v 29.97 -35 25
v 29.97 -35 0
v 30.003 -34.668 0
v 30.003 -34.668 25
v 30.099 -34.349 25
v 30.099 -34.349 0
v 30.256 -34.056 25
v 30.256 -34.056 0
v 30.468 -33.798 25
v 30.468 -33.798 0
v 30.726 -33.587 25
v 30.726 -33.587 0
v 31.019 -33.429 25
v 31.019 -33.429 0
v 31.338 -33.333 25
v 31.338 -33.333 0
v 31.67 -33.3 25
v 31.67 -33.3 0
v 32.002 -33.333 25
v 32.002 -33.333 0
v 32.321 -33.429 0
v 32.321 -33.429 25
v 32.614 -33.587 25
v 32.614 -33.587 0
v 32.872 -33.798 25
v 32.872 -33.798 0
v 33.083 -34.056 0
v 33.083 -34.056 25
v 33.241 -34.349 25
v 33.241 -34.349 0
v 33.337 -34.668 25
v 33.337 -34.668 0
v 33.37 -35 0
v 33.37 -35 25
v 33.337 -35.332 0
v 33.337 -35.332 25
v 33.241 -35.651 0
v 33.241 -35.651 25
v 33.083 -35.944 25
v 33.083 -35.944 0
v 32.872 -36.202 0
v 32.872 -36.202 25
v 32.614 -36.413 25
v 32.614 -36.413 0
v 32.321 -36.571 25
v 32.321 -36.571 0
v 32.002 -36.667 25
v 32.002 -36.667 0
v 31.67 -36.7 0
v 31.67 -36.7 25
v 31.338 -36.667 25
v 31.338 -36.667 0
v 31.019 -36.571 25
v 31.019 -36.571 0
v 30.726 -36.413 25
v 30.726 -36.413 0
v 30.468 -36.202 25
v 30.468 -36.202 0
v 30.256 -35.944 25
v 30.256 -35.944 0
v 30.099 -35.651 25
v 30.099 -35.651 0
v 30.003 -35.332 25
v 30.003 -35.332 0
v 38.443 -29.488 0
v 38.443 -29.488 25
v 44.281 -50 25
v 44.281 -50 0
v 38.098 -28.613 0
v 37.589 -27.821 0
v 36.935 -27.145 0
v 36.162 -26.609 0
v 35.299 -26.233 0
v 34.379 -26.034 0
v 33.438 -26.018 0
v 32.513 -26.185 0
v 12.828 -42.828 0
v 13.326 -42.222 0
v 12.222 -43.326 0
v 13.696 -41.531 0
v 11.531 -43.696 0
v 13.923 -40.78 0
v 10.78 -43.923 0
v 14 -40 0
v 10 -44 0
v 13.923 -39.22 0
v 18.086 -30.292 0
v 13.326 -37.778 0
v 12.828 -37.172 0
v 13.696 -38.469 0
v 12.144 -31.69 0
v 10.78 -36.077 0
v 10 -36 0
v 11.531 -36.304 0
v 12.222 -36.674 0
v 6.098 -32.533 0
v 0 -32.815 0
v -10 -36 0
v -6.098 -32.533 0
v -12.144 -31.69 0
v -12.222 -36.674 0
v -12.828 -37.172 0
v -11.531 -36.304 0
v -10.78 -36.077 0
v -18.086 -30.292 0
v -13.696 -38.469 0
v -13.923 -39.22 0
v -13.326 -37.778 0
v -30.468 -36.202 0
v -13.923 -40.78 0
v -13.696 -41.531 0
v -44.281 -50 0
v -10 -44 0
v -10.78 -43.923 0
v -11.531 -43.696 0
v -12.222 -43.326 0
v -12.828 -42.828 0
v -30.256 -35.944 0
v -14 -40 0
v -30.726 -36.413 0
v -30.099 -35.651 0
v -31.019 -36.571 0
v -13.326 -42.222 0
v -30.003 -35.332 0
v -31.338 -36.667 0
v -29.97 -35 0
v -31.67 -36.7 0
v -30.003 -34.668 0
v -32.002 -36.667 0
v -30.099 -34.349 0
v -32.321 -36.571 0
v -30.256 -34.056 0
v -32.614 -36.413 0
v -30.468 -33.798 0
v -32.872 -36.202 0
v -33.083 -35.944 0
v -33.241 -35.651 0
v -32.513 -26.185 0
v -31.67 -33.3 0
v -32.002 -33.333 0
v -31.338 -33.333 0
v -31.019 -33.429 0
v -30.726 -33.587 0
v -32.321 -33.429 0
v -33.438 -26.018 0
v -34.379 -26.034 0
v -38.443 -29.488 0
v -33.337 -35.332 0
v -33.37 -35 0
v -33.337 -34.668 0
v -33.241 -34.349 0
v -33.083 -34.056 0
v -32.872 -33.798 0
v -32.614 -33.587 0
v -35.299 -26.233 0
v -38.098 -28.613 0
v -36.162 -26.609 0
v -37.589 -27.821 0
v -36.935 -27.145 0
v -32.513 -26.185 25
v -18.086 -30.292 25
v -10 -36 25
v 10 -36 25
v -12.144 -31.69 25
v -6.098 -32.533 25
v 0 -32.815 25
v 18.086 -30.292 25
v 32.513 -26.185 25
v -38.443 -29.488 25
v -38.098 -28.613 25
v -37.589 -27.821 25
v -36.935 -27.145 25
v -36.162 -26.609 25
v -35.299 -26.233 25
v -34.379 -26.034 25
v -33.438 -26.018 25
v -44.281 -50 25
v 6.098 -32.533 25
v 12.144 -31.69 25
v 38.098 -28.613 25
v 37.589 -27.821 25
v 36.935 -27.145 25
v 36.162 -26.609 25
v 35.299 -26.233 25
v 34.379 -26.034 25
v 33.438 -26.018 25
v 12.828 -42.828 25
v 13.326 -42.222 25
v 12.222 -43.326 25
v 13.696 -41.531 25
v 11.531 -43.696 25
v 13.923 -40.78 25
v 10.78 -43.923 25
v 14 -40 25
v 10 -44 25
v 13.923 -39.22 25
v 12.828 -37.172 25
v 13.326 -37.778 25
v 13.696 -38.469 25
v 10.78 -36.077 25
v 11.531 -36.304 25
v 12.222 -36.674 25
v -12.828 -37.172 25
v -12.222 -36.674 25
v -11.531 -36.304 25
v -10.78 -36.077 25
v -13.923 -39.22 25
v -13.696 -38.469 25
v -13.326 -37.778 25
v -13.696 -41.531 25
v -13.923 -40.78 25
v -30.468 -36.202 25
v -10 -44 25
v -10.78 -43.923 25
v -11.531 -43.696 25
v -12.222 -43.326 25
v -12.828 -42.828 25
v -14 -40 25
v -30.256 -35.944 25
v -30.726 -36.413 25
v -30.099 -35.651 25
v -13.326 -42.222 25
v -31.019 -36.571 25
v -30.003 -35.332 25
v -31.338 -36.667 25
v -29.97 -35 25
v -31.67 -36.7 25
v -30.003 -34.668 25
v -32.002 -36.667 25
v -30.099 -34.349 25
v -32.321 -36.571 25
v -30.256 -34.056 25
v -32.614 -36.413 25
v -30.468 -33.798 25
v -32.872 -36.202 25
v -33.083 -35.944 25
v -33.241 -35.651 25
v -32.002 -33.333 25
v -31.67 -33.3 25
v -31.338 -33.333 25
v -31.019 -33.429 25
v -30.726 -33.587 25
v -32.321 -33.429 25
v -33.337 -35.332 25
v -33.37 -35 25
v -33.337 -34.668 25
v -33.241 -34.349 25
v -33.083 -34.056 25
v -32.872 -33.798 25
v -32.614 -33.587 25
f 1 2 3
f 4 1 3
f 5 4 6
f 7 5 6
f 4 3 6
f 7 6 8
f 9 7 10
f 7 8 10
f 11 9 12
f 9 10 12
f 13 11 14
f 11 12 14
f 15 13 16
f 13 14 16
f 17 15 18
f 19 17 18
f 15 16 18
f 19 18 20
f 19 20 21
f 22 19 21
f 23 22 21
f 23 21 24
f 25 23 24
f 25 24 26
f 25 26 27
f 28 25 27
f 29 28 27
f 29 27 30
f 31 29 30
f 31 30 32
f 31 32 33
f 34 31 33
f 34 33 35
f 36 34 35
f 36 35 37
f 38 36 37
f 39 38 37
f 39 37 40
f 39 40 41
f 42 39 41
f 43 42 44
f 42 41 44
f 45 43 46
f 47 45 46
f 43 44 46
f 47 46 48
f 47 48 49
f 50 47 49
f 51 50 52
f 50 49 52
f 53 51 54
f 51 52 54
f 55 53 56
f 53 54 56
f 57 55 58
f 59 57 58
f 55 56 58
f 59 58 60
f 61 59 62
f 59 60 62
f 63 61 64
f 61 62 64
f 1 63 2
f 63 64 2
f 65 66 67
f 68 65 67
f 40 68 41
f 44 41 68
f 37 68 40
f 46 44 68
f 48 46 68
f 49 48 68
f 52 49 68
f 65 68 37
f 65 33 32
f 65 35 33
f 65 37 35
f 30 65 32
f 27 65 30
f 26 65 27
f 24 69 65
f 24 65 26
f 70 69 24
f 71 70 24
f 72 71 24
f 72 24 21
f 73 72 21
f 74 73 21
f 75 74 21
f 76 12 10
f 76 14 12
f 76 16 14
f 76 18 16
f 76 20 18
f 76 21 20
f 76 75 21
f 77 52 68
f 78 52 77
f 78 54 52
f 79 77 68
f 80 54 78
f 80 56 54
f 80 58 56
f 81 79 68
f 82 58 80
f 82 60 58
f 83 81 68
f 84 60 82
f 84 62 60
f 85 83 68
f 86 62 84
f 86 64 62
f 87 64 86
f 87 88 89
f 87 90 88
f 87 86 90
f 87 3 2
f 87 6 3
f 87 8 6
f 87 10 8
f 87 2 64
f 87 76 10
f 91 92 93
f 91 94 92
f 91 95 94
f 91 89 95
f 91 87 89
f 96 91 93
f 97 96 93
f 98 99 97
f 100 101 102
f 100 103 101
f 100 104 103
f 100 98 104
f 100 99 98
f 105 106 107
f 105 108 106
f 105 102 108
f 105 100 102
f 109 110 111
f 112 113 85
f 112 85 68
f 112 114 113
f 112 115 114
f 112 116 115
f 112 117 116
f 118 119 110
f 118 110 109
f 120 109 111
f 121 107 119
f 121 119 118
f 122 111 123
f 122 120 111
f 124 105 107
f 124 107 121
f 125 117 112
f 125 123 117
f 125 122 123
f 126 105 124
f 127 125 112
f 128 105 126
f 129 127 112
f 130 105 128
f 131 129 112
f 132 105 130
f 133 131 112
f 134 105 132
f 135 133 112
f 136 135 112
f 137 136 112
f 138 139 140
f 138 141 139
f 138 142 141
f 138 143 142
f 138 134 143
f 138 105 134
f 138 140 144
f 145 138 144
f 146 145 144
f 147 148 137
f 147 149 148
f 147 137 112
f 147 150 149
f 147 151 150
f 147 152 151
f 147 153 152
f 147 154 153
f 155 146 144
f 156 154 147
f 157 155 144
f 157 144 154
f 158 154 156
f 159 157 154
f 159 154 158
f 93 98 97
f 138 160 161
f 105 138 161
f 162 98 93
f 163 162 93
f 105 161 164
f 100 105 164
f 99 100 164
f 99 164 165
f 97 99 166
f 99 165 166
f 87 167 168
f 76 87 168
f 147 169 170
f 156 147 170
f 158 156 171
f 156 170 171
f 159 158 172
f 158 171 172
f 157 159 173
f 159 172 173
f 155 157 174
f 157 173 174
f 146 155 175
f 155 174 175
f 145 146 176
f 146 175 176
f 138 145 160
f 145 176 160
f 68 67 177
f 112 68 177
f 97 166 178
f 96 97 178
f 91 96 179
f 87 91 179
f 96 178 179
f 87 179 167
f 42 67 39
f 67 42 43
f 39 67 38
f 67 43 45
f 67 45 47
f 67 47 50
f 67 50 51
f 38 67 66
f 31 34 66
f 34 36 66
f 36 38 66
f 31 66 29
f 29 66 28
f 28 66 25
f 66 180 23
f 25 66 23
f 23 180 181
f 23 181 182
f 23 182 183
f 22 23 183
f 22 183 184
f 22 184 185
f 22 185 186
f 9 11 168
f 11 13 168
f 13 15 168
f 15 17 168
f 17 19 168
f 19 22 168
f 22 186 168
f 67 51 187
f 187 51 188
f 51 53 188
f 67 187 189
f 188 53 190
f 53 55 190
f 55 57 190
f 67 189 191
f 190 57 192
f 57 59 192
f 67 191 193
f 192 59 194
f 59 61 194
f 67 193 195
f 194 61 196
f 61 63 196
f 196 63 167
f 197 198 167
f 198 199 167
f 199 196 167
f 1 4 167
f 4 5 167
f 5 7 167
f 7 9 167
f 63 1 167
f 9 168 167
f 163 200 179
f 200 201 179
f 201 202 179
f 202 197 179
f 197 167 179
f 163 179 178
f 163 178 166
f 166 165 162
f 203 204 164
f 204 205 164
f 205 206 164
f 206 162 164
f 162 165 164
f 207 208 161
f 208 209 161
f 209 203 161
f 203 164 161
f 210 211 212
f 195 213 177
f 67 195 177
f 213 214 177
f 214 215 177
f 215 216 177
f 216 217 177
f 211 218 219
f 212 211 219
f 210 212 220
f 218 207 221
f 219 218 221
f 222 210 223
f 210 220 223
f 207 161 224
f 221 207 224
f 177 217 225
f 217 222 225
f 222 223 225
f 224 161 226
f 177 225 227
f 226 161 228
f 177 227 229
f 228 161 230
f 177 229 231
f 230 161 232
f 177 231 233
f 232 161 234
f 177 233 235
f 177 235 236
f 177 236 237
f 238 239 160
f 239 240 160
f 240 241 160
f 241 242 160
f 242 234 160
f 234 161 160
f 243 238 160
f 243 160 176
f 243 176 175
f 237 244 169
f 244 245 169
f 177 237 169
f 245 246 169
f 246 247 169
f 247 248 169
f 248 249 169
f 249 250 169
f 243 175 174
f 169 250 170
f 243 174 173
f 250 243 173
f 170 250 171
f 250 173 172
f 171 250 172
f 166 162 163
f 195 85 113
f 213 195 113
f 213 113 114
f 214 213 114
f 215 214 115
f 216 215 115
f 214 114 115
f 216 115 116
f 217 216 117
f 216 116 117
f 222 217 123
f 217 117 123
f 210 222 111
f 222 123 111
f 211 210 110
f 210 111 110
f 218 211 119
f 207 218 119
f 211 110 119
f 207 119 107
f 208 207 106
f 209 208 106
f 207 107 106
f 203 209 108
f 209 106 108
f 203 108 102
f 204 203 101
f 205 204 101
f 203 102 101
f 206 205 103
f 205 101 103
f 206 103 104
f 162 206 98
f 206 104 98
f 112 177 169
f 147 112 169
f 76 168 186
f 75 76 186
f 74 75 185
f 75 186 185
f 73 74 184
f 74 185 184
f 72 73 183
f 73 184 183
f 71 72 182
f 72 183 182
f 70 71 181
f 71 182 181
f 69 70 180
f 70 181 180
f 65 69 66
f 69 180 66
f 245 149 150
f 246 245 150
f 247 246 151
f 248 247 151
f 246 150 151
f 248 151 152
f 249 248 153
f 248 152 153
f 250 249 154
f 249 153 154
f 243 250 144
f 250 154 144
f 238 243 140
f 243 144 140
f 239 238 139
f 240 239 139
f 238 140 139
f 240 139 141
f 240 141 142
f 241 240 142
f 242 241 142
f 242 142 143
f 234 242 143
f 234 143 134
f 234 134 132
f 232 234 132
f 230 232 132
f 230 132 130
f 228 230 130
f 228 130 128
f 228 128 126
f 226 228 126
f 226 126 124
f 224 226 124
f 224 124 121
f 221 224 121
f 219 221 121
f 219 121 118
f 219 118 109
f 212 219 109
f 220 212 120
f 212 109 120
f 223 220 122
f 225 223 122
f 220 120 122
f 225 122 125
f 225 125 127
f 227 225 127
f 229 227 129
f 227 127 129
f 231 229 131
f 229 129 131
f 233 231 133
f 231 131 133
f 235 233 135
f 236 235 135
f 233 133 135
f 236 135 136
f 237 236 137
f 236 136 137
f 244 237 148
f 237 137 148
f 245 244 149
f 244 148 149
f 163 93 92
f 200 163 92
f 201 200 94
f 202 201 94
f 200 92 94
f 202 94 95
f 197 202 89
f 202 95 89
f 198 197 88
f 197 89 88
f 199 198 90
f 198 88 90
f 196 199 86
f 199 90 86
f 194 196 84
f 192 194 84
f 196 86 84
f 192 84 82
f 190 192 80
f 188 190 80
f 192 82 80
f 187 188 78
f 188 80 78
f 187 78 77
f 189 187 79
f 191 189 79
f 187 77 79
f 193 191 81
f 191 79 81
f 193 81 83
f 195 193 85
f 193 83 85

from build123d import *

# Parameters (mm, degrees)
BOSS_EXTRU_1_DEPTH      = 25
ENL_V_MAT_EXTRU_1_DEPTH = 26
ESQUISSE13_R            = 1.7
ENL_V_MAT_EXTRU_2_DEPTH = 29


with BuildPart() as part:
    # Esquisse1 → Boss.-Extru.1 (new body)
    with BuildSketch(Plane.XY.offset(25)):
        with BuildLine():
            Line((18.085571367, -30.291755058), (32.51257447, -26.185469451))
            ThreePointArc((32.51257447, -26.185469451), (36.161897649, -26.608505924), (38.443226857, -29.48809905))
            Line((38.443226857, -29.48809905), (44.28142645, -50))
            Line((44.28142645, -50), (-44.28142645, -50))
            Line((-44.28142645, -50), (-38.443226857, -29.48809905))
            ThreePointArc((-38.443226857, -29.48809905), (-36.161897649, -26.608505924), (-32.51257447, -26.185469451))
            Line((-32.51257447, -26.185469451), (-18.085571367, -30.291755058))
            ThreePointArc((-18.085571367, -30.291755058), (-9.130400918, -32.181477949), (0, -32.81544125))
            ThreePointArc((0, -32.81544125), (9.130400918, -32.181477949), (18.085571367, -30.291755058))
        make_face()
    extrude(amount=-BOSS_EXTRU_1_DEPTH)

    # Esquisse2 → Enlèv. mat.-Extru.1 (cut, through all)
    with BuildSketch(Plane(origin=(0, 0, 0), x_dir=(-1, 0, 0), z_dir=(0, 0, -1))):
        with BuildLine():
            Line((-10, -44), (10, -44))
            ThreePointArc((10, -44), (14, -40), (10, -36))
            Line((10, -36), (-10, -36))
            ThreePointArc((-10, -36), (-14, -40), (-10, -44))
        make_face()
    extrude(amount=-ENL_V_MAT_EXTRU_1_DEPTH, mode=Mode.SUBTRACT)

    # Esquisse13 → Enlèv. mat.-Extru.2 (cut, through all)
    with BuildSketch(Plane(origin=(0, 0, -3), x_dir=(-1, 0, 0), z_dir=(0, 0, -1))):
        with Locations((31.669980911, -35)):
            Circle(ESQUISSE13_R)
        with Locations((-31.669980911, -35)):
            Circle(ESQUISSE13_R)
    extrude(amount=-ENL_V_MAT_EXTRU_2_DEPTH, mode=Mode.SUBTRACT)


solid = part.part
